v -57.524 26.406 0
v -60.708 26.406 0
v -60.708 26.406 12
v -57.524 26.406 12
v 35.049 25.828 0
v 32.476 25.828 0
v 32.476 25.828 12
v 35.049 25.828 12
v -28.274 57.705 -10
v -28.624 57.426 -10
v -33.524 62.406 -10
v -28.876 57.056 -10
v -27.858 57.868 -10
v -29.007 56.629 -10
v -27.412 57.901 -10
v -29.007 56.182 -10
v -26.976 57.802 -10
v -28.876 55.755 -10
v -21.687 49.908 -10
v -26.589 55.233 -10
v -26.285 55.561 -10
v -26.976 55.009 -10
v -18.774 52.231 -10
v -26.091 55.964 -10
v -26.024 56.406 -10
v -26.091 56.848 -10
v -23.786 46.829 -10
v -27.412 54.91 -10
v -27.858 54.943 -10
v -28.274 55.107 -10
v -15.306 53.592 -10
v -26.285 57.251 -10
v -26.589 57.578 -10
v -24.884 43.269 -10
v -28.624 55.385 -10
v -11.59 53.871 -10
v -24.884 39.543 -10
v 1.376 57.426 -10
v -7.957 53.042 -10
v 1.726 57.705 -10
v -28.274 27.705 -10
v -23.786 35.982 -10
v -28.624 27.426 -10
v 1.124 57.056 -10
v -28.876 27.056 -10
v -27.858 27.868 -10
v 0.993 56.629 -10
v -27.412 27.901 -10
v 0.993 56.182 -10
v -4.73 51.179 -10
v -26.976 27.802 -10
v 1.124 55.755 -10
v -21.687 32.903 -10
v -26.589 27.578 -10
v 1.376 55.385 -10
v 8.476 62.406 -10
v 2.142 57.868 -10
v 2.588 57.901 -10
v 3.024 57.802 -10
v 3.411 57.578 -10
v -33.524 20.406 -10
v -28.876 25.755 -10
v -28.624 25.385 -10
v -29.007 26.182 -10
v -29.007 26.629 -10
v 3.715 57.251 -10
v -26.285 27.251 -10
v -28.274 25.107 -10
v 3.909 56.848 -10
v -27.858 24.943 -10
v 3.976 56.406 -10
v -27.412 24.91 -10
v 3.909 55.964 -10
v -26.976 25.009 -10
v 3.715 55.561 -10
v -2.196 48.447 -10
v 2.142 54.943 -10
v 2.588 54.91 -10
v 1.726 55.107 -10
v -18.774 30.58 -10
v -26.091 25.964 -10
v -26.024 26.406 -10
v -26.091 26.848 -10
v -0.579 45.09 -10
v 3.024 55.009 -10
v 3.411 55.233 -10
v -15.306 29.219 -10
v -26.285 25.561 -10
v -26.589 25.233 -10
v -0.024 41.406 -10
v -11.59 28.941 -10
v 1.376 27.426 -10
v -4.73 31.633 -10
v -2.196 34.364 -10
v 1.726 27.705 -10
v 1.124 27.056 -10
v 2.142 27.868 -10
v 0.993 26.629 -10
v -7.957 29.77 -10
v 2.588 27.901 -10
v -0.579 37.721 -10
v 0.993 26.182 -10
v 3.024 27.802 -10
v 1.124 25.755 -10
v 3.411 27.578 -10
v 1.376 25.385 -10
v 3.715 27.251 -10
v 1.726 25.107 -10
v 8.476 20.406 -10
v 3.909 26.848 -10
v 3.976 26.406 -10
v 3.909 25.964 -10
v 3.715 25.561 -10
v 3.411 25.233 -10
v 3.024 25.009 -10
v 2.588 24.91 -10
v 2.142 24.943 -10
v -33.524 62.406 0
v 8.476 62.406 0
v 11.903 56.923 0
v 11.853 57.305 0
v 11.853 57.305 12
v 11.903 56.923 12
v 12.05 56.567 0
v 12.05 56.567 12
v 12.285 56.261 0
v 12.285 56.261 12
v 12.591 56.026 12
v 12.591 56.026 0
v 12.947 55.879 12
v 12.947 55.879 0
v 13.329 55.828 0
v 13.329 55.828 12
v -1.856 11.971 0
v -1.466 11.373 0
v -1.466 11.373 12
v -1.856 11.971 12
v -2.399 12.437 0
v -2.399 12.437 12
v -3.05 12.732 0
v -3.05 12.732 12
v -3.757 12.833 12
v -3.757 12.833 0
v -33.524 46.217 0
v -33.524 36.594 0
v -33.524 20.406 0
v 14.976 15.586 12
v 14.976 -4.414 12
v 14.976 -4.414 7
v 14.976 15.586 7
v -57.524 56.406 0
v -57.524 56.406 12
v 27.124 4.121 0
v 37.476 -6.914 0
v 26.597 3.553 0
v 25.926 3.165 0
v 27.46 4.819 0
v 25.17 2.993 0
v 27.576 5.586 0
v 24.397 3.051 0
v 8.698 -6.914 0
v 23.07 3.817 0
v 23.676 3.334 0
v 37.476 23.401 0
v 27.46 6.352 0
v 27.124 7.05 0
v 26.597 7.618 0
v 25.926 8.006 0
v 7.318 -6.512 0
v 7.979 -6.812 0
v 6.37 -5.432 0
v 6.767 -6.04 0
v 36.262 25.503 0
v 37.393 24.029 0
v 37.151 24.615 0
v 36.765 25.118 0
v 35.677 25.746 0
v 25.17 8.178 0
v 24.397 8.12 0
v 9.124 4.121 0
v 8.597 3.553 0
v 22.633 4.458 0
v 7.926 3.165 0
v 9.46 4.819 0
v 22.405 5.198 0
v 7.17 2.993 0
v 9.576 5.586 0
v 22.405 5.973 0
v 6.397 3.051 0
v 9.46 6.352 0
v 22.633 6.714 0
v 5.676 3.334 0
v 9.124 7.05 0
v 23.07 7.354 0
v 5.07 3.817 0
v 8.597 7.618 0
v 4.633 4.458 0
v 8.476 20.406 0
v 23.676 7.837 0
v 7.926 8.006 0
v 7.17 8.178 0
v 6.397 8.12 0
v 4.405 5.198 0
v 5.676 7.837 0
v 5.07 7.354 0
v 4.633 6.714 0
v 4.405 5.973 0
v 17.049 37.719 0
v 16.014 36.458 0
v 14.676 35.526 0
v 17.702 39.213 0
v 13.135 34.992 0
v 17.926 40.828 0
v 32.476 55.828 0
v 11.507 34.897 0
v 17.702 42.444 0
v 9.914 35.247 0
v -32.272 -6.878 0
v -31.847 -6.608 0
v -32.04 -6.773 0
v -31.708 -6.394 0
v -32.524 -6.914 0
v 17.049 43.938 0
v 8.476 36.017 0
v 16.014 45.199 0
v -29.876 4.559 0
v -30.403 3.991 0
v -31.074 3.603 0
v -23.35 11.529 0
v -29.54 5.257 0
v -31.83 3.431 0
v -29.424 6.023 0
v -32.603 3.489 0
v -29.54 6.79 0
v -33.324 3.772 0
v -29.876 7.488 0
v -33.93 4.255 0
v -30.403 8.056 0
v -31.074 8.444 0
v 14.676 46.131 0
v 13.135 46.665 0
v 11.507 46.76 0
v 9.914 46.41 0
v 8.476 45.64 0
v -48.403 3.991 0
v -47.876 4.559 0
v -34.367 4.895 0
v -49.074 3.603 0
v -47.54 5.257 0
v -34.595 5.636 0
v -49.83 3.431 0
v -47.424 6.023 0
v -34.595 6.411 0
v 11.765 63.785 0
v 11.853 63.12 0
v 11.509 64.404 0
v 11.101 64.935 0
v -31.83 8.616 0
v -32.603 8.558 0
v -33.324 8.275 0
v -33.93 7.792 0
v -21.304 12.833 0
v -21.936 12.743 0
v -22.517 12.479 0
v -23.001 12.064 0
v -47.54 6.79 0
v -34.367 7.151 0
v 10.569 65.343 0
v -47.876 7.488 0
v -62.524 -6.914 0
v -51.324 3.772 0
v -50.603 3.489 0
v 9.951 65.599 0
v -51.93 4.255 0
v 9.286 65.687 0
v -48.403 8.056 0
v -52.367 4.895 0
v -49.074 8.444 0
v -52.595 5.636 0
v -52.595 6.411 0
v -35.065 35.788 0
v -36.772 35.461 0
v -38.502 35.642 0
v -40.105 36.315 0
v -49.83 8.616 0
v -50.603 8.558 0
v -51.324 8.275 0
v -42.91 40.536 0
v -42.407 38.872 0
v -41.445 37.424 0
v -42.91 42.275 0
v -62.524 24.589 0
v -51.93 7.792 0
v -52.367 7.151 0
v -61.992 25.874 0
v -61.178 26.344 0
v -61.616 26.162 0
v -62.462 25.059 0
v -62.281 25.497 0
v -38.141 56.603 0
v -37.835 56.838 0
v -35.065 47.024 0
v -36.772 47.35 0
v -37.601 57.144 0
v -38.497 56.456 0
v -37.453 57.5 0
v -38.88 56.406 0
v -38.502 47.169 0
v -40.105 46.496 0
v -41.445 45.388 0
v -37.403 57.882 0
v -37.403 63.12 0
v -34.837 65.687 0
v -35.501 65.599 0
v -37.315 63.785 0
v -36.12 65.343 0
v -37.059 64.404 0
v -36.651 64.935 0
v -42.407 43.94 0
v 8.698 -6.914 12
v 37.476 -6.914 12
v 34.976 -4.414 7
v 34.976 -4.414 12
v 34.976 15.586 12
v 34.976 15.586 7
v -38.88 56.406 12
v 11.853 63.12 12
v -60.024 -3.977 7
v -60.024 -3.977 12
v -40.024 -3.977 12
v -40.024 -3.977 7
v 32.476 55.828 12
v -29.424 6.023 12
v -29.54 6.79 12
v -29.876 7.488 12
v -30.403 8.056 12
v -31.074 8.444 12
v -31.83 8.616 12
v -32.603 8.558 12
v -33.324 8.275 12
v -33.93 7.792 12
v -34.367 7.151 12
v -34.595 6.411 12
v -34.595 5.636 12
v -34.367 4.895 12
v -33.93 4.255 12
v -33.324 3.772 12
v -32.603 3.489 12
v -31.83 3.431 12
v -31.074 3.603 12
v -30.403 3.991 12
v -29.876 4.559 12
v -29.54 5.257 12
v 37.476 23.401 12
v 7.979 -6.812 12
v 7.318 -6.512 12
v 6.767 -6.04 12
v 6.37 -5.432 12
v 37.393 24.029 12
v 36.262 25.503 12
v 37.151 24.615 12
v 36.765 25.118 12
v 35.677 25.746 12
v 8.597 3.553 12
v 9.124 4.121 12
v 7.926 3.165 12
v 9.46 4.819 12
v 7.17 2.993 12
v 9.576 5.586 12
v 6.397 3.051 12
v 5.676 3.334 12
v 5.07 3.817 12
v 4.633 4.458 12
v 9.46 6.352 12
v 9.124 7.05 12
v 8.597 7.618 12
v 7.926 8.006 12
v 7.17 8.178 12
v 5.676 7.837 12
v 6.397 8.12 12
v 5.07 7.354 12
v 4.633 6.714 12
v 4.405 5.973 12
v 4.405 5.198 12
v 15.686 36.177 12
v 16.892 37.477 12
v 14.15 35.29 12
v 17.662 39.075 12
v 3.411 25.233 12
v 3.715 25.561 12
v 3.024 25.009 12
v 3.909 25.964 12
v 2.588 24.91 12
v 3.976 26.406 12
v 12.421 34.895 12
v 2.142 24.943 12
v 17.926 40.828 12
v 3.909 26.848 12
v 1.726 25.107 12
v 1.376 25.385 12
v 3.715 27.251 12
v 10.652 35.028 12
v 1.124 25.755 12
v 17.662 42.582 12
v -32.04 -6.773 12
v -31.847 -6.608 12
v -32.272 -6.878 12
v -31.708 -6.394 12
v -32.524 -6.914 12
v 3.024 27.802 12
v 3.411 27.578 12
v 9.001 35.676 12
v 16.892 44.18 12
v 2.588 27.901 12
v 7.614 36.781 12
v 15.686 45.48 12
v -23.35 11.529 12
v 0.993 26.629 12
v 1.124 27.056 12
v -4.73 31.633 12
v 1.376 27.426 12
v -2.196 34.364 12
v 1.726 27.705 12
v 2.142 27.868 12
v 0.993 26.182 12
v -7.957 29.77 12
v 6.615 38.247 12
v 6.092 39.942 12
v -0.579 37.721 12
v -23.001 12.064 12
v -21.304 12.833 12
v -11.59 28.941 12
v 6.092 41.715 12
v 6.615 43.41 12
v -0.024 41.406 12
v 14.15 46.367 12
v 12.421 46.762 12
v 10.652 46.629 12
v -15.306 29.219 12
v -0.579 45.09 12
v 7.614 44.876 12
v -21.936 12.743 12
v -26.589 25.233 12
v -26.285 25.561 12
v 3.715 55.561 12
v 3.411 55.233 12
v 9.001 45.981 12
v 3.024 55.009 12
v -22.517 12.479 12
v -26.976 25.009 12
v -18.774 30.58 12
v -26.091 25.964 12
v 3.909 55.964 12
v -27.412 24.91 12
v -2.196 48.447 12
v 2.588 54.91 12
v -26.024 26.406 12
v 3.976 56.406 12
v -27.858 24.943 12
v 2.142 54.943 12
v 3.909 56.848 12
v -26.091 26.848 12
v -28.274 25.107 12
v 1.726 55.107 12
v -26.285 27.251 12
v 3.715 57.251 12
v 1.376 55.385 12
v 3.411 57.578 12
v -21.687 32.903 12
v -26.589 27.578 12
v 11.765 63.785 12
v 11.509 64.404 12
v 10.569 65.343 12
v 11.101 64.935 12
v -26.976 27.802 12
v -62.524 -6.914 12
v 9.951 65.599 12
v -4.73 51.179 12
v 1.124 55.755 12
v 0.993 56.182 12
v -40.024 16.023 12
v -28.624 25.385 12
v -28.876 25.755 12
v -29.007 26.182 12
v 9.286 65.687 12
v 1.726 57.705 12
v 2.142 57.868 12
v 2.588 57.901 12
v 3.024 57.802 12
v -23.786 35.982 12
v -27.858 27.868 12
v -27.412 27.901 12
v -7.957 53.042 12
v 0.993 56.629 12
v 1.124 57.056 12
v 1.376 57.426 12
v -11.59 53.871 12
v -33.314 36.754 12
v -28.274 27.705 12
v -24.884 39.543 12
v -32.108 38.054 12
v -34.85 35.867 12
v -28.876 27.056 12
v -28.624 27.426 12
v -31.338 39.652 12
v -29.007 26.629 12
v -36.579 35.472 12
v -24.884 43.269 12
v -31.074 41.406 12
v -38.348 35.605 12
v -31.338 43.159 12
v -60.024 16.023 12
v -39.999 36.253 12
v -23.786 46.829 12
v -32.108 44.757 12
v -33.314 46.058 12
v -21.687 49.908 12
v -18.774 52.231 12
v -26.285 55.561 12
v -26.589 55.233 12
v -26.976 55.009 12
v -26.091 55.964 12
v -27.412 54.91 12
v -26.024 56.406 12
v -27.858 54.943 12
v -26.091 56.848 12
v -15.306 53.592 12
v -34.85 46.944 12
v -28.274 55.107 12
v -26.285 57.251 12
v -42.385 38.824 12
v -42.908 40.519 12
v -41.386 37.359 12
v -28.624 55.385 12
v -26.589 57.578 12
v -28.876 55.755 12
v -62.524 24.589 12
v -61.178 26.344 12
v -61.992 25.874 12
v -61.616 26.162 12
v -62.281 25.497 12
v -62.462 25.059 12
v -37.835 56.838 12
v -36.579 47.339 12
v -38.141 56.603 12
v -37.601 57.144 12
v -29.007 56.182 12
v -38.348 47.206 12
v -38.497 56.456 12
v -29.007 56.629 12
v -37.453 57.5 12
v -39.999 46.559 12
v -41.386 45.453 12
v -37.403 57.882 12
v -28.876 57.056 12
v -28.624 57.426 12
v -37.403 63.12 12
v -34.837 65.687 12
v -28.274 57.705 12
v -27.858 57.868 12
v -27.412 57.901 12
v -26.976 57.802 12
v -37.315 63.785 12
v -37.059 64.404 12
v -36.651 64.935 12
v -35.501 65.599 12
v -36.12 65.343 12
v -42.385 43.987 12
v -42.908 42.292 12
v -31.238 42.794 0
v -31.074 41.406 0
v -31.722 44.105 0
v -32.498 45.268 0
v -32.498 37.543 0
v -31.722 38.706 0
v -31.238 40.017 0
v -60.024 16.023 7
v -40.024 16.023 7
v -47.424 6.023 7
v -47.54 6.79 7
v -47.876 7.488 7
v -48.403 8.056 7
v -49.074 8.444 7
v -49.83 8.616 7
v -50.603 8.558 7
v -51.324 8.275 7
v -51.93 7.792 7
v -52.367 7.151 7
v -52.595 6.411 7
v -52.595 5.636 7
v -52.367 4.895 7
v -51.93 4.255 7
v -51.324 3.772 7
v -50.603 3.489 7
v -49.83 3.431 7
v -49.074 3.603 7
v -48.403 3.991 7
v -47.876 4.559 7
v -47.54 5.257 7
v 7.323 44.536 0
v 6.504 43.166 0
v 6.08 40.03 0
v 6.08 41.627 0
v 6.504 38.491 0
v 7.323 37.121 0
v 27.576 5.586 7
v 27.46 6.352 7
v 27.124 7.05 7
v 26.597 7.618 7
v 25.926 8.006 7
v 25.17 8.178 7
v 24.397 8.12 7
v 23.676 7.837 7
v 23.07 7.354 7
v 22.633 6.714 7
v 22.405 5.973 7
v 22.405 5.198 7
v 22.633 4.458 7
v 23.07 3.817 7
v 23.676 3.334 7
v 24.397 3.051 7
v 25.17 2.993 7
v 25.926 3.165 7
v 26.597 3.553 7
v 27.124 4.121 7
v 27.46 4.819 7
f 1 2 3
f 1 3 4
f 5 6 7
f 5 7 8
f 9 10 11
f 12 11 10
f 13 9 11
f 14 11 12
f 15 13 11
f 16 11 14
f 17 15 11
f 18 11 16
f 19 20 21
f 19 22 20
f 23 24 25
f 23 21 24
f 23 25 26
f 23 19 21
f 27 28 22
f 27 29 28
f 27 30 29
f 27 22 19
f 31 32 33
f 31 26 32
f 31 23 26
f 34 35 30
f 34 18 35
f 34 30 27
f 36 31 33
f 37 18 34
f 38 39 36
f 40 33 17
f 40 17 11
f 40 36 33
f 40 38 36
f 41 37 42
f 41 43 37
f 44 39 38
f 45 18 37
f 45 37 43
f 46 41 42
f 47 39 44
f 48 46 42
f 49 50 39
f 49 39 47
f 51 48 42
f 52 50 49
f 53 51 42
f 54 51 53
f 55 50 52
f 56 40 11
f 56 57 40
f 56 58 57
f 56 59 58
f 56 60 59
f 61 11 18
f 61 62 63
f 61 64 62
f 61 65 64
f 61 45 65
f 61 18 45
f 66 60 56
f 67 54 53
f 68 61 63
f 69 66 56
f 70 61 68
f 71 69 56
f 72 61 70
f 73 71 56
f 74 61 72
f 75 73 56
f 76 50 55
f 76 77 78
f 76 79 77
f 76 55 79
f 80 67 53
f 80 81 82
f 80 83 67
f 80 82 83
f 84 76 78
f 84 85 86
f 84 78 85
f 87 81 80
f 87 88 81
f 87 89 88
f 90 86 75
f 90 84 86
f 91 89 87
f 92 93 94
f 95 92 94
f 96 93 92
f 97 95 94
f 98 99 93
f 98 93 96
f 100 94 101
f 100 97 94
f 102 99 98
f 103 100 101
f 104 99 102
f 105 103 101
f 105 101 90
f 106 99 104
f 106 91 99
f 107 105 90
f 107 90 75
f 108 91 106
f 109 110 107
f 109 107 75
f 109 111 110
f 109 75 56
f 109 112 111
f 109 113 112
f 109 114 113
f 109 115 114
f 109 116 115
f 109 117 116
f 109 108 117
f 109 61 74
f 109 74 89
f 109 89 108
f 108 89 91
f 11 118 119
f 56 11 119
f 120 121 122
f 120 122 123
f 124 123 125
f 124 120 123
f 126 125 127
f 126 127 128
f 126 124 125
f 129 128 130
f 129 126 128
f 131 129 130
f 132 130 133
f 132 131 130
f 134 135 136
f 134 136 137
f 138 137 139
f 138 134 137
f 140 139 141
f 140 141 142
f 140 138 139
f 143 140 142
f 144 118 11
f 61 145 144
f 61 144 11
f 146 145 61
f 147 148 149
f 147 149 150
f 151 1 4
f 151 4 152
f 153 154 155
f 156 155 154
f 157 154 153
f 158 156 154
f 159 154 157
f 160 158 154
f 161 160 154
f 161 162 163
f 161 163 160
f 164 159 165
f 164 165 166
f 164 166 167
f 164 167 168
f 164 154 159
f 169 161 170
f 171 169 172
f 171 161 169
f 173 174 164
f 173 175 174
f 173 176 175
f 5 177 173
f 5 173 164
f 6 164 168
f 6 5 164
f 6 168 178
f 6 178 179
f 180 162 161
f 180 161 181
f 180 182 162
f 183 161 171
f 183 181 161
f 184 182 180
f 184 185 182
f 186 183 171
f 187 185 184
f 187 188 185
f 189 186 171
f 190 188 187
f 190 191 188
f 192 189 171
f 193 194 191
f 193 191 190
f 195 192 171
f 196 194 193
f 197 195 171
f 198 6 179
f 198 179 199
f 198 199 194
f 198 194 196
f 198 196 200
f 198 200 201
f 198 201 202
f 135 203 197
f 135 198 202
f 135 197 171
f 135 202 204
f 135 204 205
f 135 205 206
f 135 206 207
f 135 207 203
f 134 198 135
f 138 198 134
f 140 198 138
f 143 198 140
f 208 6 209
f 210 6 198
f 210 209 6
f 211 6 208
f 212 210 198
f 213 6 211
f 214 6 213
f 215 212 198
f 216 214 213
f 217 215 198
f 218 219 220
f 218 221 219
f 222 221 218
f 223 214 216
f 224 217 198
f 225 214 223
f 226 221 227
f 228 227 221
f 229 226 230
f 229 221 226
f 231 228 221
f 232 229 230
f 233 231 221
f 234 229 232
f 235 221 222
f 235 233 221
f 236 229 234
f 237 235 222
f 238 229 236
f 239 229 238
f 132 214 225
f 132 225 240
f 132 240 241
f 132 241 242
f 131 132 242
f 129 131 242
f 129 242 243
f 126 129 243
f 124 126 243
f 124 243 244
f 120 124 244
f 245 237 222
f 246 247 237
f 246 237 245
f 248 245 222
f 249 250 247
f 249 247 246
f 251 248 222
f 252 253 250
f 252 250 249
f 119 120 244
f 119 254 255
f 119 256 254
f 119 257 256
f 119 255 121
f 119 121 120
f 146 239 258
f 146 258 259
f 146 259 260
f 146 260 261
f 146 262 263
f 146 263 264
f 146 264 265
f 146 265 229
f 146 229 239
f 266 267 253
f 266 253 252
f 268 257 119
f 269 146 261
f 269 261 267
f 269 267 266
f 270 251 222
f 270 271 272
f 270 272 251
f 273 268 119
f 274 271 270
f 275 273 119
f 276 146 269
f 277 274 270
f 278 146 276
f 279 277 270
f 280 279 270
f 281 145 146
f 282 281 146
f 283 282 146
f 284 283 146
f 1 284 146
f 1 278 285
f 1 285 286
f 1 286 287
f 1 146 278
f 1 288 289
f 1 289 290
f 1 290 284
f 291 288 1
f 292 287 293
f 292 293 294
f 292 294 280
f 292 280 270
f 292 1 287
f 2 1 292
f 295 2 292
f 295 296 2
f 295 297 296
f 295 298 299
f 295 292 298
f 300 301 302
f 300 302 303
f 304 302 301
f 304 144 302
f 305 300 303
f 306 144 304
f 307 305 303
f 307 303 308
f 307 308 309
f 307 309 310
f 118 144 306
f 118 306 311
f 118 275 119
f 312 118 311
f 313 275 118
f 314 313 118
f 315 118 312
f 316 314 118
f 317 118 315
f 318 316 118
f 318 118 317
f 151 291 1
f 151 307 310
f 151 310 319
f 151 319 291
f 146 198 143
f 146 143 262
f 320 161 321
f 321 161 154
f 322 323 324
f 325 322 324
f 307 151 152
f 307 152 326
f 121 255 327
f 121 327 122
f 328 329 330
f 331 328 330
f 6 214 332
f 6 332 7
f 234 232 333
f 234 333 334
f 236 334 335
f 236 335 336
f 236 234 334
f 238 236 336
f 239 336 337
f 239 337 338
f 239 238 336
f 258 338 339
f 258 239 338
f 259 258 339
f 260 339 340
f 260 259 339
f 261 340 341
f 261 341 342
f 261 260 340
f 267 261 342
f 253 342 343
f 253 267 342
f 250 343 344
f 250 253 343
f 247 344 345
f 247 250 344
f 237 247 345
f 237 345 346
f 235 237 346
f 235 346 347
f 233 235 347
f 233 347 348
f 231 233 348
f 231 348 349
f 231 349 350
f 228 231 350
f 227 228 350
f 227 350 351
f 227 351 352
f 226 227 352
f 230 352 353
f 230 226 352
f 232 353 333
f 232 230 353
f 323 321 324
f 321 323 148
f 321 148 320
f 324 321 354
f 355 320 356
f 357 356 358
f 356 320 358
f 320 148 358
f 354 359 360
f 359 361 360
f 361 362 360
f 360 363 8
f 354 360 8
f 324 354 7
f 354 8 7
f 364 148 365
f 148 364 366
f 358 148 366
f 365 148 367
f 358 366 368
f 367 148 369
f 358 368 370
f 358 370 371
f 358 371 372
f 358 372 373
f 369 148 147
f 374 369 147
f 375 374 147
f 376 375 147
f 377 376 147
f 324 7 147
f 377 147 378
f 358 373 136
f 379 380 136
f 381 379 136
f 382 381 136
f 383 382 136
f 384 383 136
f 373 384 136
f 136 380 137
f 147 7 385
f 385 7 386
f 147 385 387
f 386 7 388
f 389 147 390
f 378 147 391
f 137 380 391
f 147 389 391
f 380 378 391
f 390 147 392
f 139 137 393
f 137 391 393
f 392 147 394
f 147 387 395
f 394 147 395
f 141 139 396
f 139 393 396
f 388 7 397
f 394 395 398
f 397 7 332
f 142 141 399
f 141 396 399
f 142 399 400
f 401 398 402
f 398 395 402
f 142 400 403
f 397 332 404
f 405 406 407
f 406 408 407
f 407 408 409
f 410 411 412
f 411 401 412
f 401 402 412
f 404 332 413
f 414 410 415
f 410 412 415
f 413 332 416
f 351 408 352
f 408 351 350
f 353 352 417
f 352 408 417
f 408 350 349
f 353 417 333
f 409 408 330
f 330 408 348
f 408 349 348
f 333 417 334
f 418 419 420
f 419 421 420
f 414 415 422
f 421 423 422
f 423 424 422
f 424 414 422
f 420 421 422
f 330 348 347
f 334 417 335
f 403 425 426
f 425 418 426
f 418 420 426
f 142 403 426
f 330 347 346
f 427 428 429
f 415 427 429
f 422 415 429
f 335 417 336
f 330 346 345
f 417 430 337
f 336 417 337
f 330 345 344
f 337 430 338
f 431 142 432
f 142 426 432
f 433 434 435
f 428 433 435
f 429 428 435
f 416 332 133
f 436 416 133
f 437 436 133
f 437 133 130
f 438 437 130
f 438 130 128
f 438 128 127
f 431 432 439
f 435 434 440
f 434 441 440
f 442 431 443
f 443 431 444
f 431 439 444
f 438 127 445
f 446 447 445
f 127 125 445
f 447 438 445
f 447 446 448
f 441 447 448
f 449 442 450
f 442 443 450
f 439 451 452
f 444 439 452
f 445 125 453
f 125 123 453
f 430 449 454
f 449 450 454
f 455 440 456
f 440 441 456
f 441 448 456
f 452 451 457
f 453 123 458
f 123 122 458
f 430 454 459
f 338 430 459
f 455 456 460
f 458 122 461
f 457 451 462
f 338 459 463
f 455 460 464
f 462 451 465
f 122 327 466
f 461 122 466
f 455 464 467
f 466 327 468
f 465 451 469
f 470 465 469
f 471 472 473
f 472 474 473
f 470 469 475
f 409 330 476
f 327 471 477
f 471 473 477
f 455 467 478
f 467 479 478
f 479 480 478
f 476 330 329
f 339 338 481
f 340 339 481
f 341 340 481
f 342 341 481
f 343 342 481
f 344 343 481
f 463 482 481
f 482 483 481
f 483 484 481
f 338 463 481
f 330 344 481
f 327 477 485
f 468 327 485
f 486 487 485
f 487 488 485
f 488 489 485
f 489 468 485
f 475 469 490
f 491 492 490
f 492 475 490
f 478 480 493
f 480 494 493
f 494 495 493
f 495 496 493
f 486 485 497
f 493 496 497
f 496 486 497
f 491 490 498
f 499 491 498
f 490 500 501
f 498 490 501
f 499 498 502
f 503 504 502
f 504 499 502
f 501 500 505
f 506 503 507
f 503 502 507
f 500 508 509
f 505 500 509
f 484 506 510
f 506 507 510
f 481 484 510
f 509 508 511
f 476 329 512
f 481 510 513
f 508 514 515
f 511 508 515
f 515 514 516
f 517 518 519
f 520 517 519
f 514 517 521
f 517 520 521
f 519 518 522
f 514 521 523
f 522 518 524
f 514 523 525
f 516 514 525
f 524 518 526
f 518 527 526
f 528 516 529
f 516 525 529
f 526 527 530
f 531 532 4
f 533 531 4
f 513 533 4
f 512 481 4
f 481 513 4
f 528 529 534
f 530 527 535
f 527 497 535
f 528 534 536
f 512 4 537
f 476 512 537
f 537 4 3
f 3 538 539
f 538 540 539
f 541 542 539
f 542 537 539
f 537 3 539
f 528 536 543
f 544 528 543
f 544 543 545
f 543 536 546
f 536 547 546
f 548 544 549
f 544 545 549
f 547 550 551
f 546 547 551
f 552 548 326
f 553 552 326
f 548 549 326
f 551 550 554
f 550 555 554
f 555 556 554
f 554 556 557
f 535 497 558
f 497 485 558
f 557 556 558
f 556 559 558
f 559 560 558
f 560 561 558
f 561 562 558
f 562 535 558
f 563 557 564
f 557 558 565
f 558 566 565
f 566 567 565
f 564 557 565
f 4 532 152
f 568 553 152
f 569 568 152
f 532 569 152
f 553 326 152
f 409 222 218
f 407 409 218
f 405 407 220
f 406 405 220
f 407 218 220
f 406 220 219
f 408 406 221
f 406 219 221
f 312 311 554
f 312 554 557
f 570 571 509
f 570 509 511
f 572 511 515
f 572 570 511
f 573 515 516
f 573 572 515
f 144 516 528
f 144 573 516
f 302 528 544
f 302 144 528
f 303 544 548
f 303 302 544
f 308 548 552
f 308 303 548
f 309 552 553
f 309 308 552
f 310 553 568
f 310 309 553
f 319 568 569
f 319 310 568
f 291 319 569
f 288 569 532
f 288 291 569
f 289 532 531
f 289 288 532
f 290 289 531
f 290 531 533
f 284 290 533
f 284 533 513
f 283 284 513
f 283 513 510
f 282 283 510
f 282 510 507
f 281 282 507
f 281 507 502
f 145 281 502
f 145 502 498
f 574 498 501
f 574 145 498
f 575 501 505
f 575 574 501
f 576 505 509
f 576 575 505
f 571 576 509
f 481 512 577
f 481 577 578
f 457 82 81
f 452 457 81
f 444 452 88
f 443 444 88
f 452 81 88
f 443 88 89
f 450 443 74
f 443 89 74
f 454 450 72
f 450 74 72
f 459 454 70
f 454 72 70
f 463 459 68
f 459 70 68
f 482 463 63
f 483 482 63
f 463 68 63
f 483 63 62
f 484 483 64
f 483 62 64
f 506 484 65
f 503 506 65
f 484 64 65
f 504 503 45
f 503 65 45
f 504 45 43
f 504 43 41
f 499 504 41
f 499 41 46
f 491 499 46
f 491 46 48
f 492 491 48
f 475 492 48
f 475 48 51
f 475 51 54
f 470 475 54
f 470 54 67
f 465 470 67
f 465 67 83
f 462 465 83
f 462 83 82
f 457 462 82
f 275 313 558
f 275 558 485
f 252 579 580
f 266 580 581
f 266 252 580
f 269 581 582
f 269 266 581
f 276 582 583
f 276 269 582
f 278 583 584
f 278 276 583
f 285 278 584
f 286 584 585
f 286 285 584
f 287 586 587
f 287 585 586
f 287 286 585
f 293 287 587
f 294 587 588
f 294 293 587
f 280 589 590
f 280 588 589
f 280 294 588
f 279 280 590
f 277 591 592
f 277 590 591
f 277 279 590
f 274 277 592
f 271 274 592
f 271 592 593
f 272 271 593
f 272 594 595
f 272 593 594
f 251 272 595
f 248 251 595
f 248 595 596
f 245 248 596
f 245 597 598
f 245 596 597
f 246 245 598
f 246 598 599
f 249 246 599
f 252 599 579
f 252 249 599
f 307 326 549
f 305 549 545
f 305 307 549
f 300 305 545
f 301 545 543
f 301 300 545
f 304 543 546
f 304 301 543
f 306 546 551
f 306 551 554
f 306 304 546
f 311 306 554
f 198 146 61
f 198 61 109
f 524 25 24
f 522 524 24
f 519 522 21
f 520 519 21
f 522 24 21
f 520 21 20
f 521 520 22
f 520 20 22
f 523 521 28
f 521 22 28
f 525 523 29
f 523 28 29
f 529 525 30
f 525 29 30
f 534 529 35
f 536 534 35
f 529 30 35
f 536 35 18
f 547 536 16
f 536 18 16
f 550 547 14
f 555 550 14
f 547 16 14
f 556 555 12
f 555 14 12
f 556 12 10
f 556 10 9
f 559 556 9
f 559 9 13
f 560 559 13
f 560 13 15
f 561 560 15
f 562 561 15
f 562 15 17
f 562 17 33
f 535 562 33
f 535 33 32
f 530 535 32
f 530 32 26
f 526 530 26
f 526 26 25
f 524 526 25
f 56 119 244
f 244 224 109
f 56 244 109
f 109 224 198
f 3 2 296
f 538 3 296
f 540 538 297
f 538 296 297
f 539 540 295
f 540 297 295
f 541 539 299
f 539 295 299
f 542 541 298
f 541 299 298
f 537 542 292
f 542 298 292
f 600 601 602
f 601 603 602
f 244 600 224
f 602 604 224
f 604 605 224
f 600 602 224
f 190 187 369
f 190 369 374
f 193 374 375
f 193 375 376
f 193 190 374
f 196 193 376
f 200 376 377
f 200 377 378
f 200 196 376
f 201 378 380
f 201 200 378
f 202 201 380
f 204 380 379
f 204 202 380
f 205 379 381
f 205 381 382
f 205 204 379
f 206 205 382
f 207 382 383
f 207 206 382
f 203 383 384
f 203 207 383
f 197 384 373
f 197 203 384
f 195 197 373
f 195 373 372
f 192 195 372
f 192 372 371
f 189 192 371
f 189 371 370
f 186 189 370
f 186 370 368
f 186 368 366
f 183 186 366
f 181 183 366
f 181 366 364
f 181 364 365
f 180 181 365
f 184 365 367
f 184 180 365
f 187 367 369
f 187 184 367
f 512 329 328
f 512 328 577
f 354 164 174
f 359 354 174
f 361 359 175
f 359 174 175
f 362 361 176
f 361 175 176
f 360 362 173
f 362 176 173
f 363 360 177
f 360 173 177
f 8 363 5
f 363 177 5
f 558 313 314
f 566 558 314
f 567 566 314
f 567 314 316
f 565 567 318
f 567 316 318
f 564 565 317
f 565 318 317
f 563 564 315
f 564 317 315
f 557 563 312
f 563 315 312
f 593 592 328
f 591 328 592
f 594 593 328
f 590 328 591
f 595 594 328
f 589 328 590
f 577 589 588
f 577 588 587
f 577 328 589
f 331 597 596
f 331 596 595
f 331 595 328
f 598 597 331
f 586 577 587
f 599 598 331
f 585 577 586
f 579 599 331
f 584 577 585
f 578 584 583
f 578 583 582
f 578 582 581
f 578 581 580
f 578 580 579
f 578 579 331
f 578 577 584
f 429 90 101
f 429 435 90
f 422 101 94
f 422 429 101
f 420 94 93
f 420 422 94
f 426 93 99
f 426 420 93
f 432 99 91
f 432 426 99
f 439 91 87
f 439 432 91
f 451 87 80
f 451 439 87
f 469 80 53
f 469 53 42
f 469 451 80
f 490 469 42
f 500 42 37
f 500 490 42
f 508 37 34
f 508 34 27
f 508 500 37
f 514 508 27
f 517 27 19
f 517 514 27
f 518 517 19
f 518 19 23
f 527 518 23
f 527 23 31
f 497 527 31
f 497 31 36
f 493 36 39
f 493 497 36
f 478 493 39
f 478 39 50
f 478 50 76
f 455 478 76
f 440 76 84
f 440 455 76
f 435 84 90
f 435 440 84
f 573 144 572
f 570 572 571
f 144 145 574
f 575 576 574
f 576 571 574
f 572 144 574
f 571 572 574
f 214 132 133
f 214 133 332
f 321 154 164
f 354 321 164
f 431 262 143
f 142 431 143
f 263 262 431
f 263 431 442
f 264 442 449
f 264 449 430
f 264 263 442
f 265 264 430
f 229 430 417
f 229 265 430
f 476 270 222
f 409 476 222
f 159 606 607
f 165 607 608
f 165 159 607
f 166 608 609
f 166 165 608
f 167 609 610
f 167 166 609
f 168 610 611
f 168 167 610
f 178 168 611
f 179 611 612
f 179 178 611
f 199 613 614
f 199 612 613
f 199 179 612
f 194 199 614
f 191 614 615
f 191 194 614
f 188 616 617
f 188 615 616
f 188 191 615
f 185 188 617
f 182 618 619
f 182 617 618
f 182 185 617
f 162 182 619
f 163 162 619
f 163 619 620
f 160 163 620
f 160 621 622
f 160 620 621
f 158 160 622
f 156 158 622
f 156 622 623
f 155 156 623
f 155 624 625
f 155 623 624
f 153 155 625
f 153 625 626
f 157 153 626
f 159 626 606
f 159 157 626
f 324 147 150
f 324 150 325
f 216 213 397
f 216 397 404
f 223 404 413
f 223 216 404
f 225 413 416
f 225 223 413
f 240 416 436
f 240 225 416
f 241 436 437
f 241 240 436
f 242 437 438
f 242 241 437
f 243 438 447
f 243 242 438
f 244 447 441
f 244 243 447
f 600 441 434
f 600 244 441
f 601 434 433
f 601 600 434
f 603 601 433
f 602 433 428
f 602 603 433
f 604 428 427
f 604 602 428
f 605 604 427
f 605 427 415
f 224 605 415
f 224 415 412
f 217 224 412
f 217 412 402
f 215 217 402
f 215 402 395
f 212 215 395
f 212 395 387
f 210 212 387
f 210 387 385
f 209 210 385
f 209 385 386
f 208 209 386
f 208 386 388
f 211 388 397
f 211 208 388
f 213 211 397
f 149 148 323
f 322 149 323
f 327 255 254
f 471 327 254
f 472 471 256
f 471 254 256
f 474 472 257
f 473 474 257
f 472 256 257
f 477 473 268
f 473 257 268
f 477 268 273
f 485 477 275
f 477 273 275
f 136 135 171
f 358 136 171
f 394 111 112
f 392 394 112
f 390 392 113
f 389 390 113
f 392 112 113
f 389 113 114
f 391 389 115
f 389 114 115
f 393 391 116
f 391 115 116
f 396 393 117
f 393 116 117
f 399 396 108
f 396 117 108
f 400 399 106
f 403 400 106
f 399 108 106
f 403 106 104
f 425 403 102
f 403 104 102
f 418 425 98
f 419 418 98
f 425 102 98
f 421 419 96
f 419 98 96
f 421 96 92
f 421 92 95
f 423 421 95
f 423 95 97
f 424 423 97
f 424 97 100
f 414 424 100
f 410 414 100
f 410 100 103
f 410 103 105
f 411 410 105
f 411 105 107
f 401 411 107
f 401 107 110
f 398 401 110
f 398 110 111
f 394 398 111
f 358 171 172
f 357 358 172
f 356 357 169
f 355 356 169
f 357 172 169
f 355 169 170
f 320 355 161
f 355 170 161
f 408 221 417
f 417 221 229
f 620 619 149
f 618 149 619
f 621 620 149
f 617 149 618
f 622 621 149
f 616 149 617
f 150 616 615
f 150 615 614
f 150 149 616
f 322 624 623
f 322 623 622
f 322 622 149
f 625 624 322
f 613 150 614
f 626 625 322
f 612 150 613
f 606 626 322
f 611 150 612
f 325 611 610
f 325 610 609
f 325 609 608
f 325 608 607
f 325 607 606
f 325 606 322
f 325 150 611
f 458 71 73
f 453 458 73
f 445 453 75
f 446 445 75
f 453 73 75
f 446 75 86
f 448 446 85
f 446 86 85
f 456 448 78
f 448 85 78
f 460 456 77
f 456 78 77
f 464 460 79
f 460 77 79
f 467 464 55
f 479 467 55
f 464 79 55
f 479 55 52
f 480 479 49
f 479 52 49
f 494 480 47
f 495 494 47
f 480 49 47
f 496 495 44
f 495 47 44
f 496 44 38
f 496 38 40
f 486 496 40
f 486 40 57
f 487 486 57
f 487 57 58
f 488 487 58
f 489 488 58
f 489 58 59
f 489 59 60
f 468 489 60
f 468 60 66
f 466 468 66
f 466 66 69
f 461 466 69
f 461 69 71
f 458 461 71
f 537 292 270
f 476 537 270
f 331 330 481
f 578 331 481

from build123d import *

# Parameters (mm, degrees)
SKETCH_R        = 2.6
SKETCH_R_2      = 12.5
SKETCH_R_3      = 5.95
PAD_DEPTH       = 12
SKETCH001_W     = 42
SKETCH001_H     = 42
SKETCH001_R     = 12.5
PAD001_DEPTH    = 10
SKETCH002_R     = 1.5
POCKET_DEPTH    = 35
SKETCH003_W     = 20
SKETCH003_H     = 20
POCKET001_DEPTH = 5


with BuildPart() as part:
    # Sketch → Pad (new body)
    with BuildSketch(Plane.XY):
        with BuildLine():
            Line((32.475943, 55.828477), (32.475943, 25.828477))
            Line((32.475943, 25.828477), (35.048585, 25.828477))
            ThreePointArc((37.475943, 23.401119), (36.764986, 25.11752), (35.048585, 25.828477))
            Line((37.475943, 23.401119), (37.475943, 20.978201))
            Line((37.475943, -6.914348), (37.475943, 20.978201))
            Line((8.697616, -6.914348), (37.475943, -6.914348))
            ThreePointArc((6.370265, -5.431662), (7.317859, -6.512185), (8.697616, -6.914348))
            Line((-1.46574, 11.372705), (6.370265, -5.431662))
            ThreePointArc((-1.46574, 11.372705), (-2.398838, 12.4367), (-3.75749, 12.832711))
            Line((-21.304181, 12.832711), (-3.75749, 12.832711))
            ThreePointArc((-21.304181, 12.832711), (-22.516993, 12.479209), (-23.349932, 11.529424))
            Line((-31.707968, -6.394442), (-23.349932, 11.529424))
            ThreePointArc((-32.524057, -6.914348), (-32.040243, -6.773329), (-31.707968, -6.394442))
            Line((-62.524057, -6.914348), (-32.524057, -6.914348))
            Line((-62.524057, 17.407665), (-62.524057, -6.914348))
            Line((-62.524057, 17.407665), (-62.524057, 24.589269))
            ThreePointArc((-60.707672, 26.405654), (-61.99205, 25.873647), (-62.524057, 24.589269))
            Line((-60.707672, 26.405654), (-57.524057, 26.405654))
            Line((-57.524057, 26.405654), (-57.524057, 56.405654))
            Line((-57.524057, 56.405654), (-38.879514, 56.405654))
            ThreePointArc((-38.879514, 56.405654), (-37.835318, 56.838174), (-37.402798, 57.882371))
            Line((-37.402798, 57.882371), (-37.402798, 63.120448))
            ThreePointArc((-34.836585, 65.686661), (-36.651171, 64.935034), (-37.402798, 63.120448))
            Line((-34.836585, 65.686661), (9.286369, 65.686661))
            ThreePointArc((11.852582, 63.120448), (11.100956, 64.935034), (9.286369, 65.686661))
            Line((11.852582, 63.120448), (11.852582, 57.305194))
            ThreePointArc((11.852582, 57.305194), (12.285103, 56.260997), (13.329299, 55.828477))
            Line((13.329299, 55.828477), (32.475943, 55.828477))
        make_face()
        with Locations((-50.024057, 6.023385)):
            Circle(SKETCH_R, mode=Mode.SUBTRACT)
        with Locations((-32.024057, 6.023385)):
            Circle(SKETCH_R, mode=Mode.SUBTRACT)
        with Locations((24.975943, 5.585652)):
            Circle(SKETCH_R, mode=Mode.SUBTRACT)
        with Locations((6.975943, 5.585652)):
            Circle(SKETCH_R, mode=Mode.SUBTRACT)
        with Locations((-12.524057, 41.405654)):
            Circle(SKETCH_R_2, mode=Mode.SUBTRACT)
        with Locations((-37.024057, 41.405654)):
            Circle(SKETCH_R_3, mode=Mode.SUBTRACT)
        with Locations((11.975943, 40.828477)):
            Circle(SKETCH_R_3, mode=Mode.SUBTRACT)
    extrude(amount=PAD_DEPTH)

    # Sketch001 (on Face36 of Pad) → Pad001 (join)
    with BuildSketch(Plane(origin=(0, 0, 0), x_dir=(1, 0, 0), z_dir=(0, 0, -1))):
        with Locations((-12.524057, -41.405654)):
            Rectangle(SKETCH001_W, SKETCH001_H)
        with Locations((-12.524057, -41.405654)):
            Circle(SKETCH001_R, mode=Mode.SUBTRACT)
    extrude(amount=PAD001_DEPTH)

    # Sketch002 (on Face43 of Pad001) → Pocket (cut)
    with BuildSketch(Plane(origin=(0, 0, -10), x_dir=(1, 0, 0), z_dir=(0, 0, -1))):
        with Locations((-27.524057, -26.405654)):
            Circle(SKETCH002_R)
        with Locations((2.475943, -26.405654)):
            Circle(SKETCH002_R)
        with Locations((2.475943, -56.405654)):
            Circle(SKETCH002_R)
        with Locations((-27.524057, -56.405654)):
            Circle(SKETCH002_R)
    extrude(amount=-POCKET_DEPTH, mode=Mode.SUBTRACT)

    # Sketch003 (on Face5 of Pocket) → Pocket001 (cut)
    with BuildSketch(Plane.XY.offset(12)):
        with Locations((-50.024057, 6.023385)):
            Rectangle(SKETCH003_W, SKETCH003_H)
        with Locations((24.975943, 5.585652)):
            Rectangle(SKETCH003_W, SKETCH003_H)
    extrude(amount=-POCKET001_DEPTH, mode=Mode.SUBTRACT)


solid = part.part
